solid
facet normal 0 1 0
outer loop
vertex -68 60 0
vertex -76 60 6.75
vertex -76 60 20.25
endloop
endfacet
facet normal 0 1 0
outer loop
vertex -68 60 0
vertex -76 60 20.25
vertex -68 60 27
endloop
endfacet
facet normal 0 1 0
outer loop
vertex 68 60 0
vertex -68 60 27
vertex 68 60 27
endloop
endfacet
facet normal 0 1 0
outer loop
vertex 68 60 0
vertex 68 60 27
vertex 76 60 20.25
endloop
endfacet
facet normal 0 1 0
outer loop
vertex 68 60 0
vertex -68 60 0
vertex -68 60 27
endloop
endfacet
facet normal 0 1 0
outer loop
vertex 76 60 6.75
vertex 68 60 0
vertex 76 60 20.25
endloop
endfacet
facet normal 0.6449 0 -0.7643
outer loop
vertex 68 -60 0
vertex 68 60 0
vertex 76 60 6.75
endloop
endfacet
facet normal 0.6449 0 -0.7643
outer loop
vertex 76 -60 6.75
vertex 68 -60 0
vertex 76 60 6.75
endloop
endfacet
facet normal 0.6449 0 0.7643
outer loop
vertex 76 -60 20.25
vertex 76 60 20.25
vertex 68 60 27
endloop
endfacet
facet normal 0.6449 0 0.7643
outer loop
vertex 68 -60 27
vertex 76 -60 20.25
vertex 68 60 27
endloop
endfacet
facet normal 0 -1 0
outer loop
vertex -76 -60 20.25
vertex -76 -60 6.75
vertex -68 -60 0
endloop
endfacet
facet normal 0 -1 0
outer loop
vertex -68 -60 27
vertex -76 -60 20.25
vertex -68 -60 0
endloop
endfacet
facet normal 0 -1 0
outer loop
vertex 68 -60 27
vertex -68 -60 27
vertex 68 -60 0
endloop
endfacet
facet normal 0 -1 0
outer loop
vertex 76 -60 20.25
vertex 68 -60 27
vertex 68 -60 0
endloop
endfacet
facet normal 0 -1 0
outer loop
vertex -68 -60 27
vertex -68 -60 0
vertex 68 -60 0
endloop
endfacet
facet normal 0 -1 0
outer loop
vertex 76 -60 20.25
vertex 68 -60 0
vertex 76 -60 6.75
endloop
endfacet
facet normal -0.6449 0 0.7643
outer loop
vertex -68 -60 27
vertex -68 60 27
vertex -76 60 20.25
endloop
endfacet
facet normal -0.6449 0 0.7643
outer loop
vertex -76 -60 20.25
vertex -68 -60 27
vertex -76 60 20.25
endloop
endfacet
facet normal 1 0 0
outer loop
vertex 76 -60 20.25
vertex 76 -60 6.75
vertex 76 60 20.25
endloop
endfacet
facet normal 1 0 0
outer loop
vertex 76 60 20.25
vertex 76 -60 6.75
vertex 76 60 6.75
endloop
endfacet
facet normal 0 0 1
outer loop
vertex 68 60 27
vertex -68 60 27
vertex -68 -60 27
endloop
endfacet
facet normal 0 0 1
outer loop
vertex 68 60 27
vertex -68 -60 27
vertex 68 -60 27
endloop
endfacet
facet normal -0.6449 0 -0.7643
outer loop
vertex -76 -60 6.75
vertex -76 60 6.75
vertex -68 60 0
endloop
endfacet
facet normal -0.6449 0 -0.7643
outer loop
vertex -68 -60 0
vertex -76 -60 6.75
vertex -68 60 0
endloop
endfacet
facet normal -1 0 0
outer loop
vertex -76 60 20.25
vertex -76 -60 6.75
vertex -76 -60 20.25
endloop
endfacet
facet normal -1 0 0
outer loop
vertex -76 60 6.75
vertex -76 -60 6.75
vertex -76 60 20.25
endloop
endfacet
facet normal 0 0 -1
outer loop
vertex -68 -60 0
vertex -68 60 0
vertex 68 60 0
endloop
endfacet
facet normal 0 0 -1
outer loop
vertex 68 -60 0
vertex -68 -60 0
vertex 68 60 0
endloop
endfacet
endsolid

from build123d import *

# Parameters (mm, degrees)
F0_W     = 152
F0_H     = 120
F1_DEPTH = 27
F3_DEPTH = 120.001


with BuildPart() as f1:
    # F0 (on Top) → F1 (new body)
    with BuildSketch(Plane.XY):
        Rectangle(F0_W, F0_H)
    extrude(amount=F1_DEPTH)

    # F2 (on face) → F3 (cut, through all)
    with BuildSketch(Plane(origin=(0, 60, 0), x_dir=(-1, 0, 0), z_dir=(0, 1, 0))):
        Polygon((-76, 20.25), (-68, 27), (-76, 27), align=None)
        Polygon((-76, 0), (-68, 0), (-76, 6.75), align=None)
        Polygon((76, 6.75), (68, 0), (76, 0), align=None)
        Polygon((76, 27), (68, 27), (76, 20.25), align=None)
    extrude(amount=-F3_DEPTH, mode=Mode.SUBTRACT)


solid = f1.part
